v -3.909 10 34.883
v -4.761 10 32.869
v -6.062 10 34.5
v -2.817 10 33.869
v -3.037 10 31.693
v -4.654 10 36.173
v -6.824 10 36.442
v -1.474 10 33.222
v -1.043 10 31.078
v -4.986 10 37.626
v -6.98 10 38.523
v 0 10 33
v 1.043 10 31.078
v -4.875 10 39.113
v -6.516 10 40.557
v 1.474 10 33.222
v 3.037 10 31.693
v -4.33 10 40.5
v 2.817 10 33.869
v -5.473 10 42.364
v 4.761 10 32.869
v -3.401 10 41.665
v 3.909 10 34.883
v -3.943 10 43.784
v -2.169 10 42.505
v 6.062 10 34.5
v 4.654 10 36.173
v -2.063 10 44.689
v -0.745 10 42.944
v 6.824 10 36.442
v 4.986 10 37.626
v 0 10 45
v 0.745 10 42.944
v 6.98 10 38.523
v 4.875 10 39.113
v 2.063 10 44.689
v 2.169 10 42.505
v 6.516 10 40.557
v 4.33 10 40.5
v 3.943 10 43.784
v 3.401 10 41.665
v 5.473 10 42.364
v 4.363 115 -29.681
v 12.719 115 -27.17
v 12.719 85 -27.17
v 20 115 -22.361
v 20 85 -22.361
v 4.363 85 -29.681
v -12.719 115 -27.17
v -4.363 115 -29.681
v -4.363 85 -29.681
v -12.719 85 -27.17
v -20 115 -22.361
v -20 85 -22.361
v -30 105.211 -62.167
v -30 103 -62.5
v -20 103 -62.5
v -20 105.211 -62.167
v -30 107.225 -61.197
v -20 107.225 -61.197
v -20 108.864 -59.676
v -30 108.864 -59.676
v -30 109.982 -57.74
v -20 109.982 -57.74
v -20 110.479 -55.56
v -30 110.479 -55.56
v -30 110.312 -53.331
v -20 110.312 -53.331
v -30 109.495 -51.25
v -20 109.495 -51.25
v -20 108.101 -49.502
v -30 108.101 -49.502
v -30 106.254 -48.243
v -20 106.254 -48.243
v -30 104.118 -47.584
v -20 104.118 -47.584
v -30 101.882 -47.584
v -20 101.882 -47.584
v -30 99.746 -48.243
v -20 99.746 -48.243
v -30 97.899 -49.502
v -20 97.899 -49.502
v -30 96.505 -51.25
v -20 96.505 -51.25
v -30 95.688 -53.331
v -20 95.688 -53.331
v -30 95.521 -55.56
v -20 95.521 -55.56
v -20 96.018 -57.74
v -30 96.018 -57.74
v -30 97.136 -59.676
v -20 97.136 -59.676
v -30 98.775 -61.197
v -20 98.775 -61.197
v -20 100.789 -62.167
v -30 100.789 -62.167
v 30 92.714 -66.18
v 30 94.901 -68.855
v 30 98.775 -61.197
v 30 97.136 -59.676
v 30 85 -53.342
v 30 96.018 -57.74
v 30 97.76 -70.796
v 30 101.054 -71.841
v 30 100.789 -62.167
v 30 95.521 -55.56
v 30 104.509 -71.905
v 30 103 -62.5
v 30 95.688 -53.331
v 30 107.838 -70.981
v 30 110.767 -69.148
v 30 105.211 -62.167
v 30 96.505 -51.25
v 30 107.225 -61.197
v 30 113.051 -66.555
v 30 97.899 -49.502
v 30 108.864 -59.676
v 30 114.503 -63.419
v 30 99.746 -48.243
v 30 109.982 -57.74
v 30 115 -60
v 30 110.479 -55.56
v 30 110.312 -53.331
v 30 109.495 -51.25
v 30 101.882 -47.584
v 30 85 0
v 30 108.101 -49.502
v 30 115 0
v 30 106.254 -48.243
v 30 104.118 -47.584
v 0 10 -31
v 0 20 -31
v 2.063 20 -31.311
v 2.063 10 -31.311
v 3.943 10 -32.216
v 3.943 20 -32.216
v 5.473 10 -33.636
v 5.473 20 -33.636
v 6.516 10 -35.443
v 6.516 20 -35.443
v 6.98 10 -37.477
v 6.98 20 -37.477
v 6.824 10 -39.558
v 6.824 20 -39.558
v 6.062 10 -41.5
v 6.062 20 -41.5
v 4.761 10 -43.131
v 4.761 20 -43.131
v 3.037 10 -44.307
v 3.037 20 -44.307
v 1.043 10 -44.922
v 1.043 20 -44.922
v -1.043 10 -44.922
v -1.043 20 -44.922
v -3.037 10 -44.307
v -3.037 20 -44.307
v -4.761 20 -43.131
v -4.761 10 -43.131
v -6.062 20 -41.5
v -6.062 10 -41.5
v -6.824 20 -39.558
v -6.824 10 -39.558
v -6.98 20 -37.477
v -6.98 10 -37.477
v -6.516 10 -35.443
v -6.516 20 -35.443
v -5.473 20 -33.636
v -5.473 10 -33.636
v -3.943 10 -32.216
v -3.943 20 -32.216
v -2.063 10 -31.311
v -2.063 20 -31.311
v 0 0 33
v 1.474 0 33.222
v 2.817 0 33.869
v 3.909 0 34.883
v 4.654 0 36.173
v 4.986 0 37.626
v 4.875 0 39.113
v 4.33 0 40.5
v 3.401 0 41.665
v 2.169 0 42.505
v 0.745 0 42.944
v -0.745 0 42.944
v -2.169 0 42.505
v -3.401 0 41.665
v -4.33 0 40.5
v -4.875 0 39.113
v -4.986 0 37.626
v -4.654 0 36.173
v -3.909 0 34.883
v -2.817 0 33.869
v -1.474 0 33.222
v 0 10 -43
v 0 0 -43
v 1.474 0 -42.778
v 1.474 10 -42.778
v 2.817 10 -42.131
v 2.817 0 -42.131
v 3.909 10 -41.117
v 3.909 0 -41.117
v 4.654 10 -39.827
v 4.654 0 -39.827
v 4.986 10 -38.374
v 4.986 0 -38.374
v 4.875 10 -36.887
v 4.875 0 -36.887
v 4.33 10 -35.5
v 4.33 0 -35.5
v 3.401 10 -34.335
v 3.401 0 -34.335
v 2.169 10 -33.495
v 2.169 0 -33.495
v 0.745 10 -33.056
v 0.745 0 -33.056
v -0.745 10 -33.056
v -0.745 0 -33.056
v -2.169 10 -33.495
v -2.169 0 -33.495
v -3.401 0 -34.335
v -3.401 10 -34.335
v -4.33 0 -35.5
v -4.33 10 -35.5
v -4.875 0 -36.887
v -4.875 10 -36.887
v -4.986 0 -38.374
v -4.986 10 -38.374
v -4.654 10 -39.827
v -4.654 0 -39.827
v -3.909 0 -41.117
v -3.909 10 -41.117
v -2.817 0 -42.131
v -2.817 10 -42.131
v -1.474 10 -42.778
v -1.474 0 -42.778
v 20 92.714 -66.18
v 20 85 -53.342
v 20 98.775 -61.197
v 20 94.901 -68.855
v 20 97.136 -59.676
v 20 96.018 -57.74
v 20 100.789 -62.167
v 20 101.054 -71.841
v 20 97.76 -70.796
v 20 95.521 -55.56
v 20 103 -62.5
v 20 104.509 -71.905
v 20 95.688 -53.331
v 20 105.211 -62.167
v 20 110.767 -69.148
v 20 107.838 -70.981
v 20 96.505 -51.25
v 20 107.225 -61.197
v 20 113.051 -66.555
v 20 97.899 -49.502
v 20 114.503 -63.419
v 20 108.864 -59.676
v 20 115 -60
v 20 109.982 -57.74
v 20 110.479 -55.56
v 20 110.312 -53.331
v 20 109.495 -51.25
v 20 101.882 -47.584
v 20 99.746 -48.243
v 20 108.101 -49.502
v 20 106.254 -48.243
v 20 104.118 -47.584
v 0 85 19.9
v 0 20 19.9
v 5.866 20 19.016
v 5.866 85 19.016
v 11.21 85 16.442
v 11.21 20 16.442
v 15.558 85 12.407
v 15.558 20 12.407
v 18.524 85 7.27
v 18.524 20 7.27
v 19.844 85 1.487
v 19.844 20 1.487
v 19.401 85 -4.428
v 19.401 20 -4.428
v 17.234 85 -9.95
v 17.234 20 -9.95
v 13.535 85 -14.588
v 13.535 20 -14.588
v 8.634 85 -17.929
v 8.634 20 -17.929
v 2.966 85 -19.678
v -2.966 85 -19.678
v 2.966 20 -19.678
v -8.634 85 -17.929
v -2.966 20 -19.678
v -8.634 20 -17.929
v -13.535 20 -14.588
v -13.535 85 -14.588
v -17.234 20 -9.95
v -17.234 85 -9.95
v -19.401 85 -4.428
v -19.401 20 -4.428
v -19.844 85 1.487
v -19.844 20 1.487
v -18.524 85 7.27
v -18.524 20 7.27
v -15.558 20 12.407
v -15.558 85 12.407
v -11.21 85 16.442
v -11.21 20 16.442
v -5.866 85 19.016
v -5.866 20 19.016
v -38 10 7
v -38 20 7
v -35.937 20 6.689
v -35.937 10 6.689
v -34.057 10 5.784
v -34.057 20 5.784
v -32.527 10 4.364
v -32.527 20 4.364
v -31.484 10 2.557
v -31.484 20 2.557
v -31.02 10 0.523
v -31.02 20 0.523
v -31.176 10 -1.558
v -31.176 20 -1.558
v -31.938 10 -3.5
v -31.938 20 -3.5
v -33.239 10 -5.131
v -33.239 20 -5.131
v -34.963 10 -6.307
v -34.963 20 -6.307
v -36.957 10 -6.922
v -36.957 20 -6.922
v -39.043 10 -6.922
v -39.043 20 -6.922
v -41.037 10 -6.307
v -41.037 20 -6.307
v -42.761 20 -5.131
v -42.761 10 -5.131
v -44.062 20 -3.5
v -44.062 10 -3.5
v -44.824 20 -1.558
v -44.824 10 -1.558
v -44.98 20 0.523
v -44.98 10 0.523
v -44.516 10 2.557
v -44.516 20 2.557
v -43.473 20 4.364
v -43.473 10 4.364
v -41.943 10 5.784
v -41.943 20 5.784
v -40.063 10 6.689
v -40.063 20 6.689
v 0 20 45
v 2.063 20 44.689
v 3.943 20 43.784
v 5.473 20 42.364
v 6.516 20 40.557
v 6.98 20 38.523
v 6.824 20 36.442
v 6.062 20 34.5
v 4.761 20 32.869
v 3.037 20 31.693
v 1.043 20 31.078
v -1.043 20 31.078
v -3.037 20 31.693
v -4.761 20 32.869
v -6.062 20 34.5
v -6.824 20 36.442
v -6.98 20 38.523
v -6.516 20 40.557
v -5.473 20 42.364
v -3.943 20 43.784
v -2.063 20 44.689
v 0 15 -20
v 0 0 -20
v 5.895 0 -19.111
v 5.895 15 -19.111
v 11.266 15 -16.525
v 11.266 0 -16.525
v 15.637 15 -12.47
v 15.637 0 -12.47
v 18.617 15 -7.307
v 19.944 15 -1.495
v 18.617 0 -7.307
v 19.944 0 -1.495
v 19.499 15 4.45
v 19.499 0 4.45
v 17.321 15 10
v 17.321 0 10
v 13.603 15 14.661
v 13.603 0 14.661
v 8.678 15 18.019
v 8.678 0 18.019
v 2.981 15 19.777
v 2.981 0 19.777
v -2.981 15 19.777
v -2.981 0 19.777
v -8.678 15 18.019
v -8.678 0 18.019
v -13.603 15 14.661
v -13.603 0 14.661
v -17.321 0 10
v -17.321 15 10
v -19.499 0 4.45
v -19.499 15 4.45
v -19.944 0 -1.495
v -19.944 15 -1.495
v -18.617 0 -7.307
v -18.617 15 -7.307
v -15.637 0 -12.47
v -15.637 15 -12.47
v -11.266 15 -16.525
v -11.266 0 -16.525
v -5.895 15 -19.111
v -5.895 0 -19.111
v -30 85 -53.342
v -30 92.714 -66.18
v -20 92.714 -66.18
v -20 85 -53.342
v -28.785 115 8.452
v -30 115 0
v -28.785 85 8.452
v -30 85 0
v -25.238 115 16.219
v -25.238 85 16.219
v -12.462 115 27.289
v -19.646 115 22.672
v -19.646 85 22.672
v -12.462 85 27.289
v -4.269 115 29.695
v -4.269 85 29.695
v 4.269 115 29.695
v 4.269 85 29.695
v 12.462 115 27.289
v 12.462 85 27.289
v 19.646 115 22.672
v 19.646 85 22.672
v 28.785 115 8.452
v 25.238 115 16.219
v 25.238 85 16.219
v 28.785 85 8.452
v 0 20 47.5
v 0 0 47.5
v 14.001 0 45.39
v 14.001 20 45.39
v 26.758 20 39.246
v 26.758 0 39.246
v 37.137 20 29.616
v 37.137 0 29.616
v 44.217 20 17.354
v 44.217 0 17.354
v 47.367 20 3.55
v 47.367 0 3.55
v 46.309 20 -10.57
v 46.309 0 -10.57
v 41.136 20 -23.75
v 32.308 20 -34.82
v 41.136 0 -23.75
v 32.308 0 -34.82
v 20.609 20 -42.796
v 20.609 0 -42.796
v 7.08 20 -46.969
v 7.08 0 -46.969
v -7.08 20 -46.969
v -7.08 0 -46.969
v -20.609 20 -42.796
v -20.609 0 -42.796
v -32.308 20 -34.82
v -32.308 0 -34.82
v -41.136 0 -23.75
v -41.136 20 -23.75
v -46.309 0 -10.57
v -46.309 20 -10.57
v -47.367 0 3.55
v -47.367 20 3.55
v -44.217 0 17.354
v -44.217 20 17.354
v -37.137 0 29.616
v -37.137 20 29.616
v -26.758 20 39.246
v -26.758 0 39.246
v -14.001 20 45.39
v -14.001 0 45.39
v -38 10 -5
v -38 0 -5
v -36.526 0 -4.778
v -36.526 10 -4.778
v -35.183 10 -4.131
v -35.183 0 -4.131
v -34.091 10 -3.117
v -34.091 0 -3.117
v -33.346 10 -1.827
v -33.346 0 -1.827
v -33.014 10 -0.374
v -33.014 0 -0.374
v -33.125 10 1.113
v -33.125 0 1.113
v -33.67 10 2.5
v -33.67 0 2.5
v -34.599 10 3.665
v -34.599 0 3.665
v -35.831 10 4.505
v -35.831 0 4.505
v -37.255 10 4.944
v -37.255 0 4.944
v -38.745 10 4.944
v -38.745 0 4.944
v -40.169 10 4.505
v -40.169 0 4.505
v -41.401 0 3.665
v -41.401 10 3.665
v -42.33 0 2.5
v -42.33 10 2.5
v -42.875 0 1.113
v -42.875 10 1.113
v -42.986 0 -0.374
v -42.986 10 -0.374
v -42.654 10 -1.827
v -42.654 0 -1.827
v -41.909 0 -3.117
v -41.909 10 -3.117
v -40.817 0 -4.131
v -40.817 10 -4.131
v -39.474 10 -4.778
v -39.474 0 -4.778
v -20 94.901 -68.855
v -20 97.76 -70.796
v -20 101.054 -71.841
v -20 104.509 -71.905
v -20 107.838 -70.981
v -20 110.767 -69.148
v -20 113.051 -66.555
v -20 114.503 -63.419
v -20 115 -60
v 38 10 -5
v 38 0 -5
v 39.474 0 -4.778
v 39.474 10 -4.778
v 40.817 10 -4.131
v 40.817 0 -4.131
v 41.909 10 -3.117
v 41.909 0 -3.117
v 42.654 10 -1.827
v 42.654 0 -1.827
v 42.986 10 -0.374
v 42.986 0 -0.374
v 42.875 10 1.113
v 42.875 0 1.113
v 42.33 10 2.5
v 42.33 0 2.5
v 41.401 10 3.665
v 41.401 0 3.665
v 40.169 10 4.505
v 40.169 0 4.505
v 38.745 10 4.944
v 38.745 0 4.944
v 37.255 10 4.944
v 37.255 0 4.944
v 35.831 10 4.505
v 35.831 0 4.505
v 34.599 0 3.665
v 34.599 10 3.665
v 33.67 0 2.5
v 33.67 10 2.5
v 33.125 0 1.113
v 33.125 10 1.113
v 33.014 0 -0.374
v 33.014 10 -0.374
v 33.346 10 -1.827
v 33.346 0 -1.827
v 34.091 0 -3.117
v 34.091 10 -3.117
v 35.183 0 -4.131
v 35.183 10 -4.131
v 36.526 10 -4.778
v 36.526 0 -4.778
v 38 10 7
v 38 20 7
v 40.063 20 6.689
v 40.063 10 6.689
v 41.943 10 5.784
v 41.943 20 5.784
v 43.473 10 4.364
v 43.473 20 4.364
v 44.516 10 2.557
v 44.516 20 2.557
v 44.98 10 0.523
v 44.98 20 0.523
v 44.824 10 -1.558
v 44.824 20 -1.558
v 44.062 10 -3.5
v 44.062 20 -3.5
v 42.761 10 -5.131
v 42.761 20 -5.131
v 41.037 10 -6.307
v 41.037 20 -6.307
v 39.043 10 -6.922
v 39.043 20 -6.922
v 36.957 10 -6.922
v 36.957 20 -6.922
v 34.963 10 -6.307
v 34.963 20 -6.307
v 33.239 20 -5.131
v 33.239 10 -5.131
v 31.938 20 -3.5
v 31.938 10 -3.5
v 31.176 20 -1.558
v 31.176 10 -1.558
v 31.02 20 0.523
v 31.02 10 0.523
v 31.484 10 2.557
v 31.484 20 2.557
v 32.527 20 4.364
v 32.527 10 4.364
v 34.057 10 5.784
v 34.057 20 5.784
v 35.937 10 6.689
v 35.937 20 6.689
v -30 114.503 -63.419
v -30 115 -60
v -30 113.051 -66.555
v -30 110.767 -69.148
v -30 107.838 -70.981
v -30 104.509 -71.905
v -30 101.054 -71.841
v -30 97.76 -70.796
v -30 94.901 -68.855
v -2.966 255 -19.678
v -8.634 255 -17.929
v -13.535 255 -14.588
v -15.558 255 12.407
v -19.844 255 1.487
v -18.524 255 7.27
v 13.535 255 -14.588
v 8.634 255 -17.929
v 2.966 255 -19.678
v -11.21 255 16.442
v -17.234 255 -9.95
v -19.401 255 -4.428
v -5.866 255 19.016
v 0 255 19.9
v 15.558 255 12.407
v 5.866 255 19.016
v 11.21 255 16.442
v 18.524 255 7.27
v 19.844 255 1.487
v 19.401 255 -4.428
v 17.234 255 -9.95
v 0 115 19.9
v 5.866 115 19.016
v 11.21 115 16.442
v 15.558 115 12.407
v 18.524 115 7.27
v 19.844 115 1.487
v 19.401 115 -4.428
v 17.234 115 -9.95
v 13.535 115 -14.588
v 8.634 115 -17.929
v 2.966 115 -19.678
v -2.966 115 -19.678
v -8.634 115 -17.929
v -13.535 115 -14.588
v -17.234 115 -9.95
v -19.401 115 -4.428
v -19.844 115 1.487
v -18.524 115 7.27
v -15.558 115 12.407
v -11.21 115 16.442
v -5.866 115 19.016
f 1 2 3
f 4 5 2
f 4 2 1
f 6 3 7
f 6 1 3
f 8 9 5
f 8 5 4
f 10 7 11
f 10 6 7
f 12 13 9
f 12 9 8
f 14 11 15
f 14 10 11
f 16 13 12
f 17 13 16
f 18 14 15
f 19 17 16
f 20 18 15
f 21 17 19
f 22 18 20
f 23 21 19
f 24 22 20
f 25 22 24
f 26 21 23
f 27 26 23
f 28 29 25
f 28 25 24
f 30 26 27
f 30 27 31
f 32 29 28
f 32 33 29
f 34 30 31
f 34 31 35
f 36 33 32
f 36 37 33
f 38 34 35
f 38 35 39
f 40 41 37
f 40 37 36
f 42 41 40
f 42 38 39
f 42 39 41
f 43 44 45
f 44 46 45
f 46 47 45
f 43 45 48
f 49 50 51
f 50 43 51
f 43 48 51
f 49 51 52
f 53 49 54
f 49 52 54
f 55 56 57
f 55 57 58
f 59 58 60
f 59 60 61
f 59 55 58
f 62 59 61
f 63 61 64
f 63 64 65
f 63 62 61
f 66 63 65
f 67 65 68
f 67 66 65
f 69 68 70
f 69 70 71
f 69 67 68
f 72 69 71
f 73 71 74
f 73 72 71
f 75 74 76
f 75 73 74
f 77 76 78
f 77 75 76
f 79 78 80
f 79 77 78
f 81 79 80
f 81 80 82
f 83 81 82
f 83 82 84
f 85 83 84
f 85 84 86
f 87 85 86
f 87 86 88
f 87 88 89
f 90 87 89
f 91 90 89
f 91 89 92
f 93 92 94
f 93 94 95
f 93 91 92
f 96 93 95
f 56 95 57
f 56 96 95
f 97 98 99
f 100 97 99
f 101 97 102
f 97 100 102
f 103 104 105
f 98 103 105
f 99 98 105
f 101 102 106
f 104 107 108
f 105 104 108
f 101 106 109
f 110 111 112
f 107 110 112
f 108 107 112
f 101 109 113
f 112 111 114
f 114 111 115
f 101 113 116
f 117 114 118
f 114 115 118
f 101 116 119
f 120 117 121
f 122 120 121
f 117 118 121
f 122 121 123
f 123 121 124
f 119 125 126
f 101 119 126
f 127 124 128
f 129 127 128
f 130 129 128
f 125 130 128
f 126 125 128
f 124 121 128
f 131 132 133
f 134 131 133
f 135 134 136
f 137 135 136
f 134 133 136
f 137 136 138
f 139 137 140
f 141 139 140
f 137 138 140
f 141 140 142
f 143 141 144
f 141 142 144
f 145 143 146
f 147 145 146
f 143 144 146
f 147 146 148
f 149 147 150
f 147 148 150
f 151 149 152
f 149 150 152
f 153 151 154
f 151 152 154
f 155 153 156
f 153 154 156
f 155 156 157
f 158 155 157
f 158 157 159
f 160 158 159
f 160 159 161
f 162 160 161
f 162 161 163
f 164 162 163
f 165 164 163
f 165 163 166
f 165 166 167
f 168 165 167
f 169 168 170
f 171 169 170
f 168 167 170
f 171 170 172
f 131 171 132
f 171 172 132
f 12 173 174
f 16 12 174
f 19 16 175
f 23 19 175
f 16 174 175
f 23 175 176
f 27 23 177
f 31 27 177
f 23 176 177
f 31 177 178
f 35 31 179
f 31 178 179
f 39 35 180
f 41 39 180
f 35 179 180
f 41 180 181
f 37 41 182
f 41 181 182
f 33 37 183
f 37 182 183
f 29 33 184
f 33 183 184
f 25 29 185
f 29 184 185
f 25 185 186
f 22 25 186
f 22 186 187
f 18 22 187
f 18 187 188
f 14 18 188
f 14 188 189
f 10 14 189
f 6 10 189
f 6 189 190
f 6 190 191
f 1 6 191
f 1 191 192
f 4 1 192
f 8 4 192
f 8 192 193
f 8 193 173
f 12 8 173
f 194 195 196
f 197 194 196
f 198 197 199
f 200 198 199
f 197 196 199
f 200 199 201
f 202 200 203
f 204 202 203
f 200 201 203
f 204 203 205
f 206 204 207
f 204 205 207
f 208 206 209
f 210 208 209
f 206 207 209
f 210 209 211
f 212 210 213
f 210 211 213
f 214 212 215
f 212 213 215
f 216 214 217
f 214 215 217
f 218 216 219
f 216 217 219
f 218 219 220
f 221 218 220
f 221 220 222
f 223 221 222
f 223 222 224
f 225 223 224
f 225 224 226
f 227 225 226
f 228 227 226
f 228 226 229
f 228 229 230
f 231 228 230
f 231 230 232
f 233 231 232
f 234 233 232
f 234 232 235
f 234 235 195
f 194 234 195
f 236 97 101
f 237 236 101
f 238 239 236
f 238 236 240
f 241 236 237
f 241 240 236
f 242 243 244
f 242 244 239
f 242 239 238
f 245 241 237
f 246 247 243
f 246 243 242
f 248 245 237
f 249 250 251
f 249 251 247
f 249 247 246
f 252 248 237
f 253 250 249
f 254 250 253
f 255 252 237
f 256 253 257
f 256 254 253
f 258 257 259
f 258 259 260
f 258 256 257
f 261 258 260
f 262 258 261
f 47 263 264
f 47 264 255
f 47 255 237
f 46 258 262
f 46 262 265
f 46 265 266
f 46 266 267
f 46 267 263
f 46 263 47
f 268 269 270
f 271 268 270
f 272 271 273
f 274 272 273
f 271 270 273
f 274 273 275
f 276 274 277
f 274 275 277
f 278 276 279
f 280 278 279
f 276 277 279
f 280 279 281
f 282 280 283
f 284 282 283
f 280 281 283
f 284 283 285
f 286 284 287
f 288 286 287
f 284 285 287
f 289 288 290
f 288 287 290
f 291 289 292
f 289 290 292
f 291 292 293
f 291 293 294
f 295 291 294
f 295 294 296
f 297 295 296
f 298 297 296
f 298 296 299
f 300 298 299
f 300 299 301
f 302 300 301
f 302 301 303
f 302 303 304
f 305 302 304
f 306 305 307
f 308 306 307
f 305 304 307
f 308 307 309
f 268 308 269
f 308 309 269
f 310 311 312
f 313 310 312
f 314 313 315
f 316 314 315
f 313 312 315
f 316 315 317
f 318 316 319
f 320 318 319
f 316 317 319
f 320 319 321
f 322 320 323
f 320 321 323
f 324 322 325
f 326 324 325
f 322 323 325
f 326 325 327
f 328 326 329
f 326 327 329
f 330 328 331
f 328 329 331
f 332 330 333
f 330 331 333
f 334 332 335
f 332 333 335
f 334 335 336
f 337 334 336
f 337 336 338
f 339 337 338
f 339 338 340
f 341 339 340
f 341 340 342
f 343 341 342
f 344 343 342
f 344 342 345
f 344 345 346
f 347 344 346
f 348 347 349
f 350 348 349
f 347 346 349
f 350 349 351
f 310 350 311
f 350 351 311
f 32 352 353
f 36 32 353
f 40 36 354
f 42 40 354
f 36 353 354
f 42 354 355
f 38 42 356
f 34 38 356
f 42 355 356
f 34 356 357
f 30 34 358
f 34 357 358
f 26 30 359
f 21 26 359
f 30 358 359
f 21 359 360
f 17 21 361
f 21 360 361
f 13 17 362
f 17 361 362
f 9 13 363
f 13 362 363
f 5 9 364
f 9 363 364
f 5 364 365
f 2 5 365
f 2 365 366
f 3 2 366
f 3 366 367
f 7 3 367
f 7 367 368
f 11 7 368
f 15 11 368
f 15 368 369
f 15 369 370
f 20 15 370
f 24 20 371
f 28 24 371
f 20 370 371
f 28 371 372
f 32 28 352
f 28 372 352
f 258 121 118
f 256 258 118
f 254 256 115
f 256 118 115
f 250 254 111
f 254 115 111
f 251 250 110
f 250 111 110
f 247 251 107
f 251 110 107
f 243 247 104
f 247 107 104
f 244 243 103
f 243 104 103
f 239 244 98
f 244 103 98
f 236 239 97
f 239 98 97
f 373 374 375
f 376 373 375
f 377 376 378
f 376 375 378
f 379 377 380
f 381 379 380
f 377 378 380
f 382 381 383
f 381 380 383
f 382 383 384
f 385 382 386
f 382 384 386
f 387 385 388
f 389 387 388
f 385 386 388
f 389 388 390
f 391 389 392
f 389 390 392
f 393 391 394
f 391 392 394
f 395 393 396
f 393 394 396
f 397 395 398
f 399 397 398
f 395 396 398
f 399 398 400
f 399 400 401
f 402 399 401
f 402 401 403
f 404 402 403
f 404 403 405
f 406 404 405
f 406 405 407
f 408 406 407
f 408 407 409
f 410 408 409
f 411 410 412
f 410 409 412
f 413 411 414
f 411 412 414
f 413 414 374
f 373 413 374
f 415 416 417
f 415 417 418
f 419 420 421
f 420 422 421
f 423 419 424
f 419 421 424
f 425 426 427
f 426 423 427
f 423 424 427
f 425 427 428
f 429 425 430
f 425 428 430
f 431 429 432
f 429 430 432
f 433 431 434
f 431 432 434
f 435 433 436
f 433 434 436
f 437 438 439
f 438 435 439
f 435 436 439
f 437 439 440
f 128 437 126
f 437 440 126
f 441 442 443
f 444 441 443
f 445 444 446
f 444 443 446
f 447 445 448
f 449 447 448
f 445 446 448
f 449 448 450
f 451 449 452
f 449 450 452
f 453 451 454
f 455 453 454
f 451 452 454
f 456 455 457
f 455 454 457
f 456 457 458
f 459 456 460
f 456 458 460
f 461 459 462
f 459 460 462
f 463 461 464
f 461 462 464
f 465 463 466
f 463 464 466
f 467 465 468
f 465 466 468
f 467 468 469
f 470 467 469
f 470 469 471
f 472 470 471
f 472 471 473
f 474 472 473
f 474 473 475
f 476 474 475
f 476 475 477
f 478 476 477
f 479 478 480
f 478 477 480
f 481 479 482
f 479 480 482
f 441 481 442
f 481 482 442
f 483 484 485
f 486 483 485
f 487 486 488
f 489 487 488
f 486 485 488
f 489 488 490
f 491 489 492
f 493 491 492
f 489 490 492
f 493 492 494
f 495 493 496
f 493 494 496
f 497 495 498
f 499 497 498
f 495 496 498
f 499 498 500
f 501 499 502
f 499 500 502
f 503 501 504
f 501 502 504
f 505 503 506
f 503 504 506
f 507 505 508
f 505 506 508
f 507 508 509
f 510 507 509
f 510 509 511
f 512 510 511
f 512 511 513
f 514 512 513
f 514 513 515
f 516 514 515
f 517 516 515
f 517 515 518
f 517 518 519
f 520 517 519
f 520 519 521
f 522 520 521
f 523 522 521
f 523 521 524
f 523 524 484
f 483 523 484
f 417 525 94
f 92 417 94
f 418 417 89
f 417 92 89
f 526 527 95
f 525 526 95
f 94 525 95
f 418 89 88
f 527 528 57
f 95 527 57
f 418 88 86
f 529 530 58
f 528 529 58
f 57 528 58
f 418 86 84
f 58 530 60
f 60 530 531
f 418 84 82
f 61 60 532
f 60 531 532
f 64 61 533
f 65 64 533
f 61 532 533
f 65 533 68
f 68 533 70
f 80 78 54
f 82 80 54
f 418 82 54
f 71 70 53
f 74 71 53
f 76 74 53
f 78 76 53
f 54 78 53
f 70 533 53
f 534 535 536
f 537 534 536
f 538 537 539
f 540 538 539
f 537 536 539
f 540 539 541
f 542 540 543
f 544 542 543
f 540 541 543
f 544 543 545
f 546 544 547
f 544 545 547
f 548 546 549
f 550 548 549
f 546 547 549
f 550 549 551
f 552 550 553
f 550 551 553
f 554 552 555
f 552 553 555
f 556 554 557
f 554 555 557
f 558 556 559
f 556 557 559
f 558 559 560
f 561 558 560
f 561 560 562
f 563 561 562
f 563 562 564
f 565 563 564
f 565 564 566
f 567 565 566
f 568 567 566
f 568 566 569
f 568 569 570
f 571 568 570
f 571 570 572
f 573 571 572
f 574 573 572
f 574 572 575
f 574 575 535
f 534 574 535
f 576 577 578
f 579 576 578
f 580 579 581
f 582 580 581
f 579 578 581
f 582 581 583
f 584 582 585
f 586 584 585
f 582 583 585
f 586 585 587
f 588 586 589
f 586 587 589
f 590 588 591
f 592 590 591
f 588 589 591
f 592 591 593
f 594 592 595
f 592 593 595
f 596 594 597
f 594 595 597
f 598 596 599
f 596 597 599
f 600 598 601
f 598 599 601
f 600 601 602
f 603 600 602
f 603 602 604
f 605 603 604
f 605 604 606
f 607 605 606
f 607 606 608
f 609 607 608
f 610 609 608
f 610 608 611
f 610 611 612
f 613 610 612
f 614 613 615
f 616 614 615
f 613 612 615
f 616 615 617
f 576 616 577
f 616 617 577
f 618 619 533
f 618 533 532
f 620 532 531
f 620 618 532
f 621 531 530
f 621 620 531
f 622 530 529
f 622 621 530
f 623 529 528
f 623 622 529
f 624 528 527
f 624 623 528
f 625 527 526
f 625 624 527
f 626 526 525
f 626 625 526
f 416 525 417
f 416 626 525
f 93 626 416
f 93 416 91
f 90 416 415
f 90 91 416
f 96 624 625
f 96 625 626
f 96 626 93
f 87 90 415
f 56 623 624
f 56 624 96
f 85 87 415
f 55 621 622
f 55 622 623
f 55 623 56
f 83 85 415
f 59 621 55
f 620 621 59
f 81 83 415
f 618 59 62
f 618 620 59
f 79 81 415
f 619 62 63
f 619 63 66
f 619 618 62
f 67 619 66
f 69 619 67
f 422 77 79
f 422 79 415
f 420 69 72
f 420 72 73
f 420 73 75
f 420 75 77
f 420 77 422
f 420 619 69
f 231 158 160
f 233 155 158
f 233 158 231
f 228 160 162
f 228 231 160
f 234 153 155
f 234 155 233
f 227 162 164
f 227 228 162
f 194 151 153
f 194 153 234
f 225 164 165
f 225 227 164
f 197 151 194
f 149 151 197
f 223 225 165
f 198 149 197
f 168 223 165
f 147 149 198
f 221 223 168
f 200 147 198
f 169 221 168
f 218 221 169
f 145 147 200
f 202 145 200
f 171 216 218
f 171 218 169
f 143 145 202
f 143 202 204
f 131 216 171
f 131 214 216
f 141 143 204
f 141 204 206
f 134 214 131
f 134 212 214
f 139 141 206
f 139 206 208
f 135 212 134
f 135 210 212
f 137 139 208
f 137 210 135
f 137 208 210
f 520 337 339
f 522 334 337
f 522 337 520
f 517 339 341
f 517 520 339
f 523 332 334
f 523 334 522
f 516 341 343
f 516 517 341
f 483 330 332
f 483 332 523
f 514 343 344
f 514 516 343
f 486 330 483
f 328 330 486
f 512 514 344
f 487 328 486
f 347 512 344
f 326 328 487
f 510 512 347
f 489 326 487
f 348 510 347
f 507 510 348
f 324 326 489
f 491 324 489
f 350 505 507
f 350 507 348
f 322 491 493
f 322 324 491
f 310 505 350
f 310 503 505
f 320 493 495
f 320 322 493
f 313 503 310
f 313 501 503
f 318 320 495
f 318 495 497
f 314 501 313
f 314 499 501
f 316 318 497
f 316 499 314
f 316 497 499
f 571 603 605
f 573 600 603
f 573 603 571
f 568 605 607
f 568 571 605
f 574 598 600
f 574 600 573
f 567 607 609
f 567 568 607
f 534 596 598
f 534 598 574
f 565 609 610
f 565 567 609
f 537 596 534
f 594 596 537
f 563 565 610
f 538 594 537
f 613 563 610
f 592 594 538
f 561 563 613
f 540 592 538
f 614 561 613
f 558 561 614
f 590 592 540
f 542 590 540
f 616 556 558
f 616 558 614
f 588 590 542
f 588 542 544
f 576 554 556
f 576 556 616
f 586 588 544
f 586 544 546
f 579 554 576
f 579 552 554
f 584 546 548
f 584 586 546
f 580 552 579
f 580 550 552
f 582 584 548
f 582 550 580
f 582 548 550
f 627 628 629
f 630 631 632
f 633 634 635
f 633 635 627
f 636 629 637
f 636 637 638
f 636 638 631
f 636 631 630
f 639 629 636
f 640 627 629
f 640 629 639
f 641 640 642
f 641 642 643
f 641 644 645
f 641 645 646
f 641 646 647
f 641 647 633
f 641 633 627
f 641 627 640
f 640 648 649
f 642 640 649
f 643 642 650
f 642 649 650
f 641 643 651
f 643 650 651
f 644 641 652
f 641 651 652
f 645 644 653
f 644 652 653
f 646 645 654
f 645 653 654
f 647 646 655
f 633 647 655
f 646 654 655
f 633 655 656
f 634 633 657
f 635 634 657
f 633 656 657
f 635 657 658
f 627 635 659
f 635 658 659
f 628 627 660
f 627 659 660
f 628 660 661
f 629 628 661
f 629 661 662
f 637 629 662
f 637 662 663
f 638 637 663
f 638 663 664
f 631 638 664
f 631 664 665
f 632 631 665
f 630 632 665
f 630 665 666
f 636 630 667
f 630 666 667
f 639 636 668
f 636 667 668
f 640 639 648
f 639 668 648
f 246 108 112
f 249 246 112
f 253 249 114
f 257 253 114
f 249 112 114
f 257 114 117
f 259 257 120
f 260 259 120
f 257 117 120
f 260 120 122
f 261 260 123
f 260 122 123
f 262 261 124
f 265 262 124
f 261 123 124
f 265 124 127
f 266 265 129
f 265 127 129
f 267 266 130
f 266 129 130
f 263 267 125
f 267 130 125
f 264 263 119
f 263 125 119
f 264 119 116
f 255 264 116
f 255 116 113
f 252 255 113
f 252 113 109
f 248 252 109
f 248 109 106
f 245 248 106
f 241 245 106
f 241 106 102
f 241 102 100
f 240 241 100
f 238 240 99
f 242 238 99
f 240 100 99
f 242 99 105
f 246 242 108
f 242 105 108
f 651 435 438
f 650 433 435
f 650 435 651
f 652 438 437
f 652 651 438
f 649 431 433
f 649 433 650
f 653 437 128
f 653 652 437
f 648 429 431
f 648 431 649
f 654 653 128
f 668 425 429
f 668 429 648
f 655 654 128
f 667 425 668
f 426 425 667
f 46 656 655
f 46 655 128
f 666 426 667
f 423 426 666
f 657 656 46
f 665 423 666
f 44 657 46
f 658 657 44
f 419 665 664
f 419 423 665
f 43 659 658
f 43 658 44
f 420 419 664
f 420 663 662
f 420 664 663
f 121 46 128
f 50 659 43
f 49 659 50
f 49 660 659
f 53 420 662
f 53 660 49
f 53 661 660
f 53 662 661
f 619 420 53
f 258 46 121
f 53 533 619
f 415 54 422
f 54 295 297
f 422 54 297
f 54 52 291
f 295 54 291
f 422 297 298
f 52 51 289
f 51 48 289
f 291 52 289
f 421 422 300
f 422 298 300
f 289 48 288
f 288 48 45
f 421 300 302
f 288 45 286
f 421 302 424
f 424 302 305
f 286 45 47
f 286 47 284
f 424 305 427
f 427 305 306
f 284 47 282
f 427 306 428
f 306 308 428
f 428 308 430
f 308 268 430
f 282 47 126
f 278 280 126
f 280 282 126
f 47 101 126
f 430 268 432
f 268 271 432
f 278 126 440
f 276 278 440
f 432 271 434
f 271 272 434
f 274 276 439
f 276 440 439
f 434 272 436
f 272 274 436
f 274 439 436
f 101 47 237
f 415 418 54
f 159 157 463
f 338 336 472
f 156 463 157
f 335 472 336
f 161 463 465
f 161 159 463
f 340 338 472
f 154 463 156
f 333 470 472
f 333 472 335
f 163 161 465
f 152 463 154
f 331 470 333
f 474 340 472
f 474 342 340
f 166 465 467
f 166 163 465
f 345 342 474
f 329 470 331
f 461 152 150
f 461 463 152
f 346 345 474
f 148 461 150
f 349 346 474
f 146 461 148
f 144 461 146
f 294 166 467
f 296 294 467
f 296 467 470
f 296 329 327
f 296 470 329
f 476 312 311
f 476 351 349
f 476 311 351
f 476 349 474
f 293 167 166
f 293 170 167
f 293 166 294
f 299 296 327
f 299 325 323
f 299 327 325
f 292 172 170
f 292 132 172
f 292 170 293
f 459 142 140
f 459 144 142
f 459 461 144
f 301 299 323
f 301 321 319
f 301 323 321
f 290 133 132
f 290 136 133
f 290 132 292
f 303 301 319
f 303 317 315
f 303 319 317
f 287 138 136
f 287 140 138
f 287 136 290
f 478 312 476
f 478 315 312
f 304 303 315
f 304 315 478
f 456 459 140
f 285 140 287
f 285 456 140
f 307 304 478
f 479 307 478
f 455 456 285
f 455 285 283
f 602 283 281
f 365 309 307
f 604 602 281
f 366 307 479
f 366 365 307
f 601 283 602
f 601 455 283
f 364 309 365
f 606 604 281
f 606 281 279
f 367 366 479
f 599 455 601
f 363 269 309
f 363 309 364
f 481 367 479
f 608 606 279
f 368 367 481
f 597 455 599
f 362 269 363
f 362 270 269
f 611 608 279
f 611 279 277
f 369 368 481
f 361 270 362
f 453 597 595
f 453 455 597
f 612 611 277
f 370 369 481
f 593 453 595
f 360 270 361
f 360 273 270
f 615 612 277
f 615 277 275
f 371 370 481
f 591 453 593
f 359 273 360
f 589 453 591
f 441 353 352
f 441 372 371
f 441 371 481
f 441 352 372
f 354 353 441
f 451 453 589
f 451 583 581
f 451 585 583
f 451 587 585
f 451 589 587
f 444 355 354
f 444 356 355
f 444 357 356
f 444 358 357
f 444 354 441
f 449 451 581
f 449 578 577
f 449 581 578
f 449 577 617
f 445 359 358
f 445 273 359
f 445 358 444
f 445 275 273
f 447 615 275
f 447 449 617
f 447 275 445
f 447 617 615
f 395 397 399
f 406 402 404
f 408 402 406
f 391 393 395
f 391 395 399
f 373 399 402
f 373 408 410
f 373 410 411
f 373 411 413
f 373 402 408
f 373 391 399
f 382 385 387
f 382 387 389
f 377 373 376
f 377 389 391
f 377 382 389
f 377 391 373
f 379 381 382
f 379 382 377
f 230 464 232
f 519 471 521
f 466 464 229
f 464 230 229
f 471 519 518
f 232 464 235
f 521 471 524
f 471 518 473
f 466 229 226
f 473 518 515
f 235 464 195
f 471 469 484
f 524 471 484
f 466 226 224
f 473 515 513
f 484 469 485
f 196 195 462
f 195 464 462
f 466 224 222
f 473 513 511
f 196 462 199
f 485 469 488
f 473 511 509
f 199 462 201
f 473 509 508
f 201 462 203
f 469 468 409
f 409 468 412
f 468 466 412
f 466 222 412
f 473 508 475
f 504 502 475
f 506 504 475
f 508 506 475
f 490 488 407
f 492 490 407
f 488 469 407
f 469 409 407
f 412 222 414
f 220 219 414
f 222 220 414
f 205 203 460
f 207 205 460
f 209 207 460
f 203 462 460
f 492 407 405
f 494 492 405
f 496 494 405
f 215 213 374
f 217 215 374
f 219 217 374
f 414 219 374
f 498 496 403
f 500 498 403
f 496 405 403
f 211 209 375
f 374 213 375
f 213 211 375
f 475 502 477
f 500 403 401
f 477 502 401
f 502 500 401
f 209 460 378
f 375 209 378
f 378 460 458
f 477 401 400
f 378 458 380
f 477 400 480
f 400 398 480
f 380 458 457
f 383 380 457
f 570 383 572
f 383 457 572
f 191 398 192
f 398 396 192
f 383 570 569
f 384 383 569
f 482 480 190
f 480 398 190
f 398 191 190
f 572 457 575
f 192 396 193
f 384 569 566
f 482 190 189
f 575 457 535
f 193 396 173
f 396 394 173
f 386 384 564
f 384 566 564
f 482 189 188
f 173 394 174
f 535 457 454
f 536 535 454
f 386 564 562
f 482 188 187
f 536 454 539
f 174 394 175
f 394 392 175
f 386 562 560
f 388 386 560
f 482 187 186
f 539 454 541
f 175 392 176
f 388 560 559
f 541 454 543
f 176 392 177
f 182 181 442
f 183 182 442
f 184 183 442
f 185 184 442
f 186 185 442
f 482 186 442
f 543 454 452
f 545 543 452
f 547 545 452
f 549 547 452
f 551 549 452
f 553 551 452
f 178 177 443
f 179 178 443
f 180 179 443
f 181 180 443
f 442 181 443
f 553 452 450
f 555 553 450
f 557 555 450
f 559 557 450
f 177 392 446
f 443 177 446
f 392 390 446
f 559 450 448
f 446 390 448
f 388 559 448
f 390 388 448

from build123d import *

# Parameters (mm, degrees)
SKETCH1_R           = 47.5
BOSS_EXTRUDE1_DEPTH = 20
SKETCH2_R           = 19.9
BOSS_EXTRUDE2_DEPTH = 65
SKETCH3_R           = 30
BOSS_EXTRUDE3_DEPTH = 30
SKETCH4_R           = 19.9
BOSS_EXTRUDE4_DEPTH = 140
SKETCH5_R           = 7.5
BOSS_EXTRUDE5_DEPTH = 10
SKETCH6_R           = 7
CUT_EXTRUDE1_DEPTH  = 10
SKETCH7_R           = 5
CUT_EXTRUDE2_DEPTH  = 23
SKETCH8_R           = 20
CUT_EXTRUDE3_DEPTH  = 15


with BuildPart() as part:
    # Sketch1 → Boss-Extrude1 (new body)
    with BuildSketch(Plane(origin=(0, 0, 0), x_dir=(1, 0, 0), z_dir=(0, 1, 0))):
        with Locations(Location((0, 0, 0), (0, 0, 270))):
            Circle(SKETCH1_R)
    extrude(amount=BOSS_EXTRUDE1_DEPTH)

    # Sketch2 → Boss-Extrude2 (add)
    with BuildSketch(Plane(origin=(0, 20, 0), x_dir=(1, 0, 0), z_dir=(0, 1, 0))):
        with Locations(Location((0, 0, 0), (0, 0, 270))):
            Circle(SKETCH2_R)
    extrude(amount=BOSS_EXTRUDE2_DEPTH)

    # Sketch3 → Boss-Extrude3 (add)
    with BuildSketch(Plane(origin=(0, 85, 0), x_dir=(1, 0, 0), z_dir=(0, 1, 0))):
        with Locations(Location((0, 0, 0), (0, 0, 270))):
            Circle(SKETCH3_R)
    extrude(amount=BOSS_EXTRUDE3_DEPTH)

    # Sketch4 → Boss-Extrude4 (add)
    with BuildSketch(Plane(origin=(0, 115, 0), x_dir=(1, 0, 0), z_dir=(0, 1, 0))):
        with Locations(Location((0, 0, 0), (0, 0, 270))):
            Circle(SKETCH4_R)
    extrude(amount=BOSS_EXTRUDE4_DEPTH)

    # Sketch5 → Boss-Extrude5 (add)
    with BuildSketch(Plane(origin=(30, 0, 0), x_dir=(0, 0, -1), z_dir=(1, 0, 0))):
        with BuildLine():
            Line((0, 115), (55, 115))
            Line((55, 115), (60, 115))
            ThreePointArc((60, 115), (71.563565439, 106.206860513), (66.180456899, 92.713992392))
            Line((66.180456899, 92.713992392), (53.342217635, 85))
            Line((53.342217635, 85), (0, 85))
            Line((0, 85), (0, 115))
        make_face()
        with Locations((55, 103)):
            Circle(SKETCH5_R, mode=Mode.SUBTRACT)
    boss_extrude5 = extrude(amount=-BOSS_EXTRUDE5_DEPTH)

    # Mirror1: Boss-Extrude5 across plane
    add(boss_extrude5.mirror(Plane(origin=(0, 0, 0), x_dir=(0, 0, 1), z_dir=(1, 0, 0))))

    # Sketch6 → Cut-Extrude1 (cut)
    with BuildSketch(Plane(origin=(0, 20, 0), x_dir=(1, 0, 0), z_dir=(0, 1, 0))):
        with Locations(Location((0, 38, 0), (0, 0, 270))):
            Circle(SKETCH6_R)
        with Locations(Location((38, 0, 0), (0, 0, 270))):
            Circle(SKETCH6_R)
        with Locations(Location((0, -38, 0), (0, 0, 270))):
            Circle(SKETCH6_R)
        with Locations(Location((-38, 0, 0), (0, 0, 270))):
            Circle(SKETCH6_R)
    extrude(amount=-CUT_EXTRUDE1_DEPTH, mode=Mode.SUBTRACT)

    # Sketch7 → Cut-Extrude2 (cut)
    with BuildSketch(Plane.XZ):
        with Locations(Location((0, 38, 0), (0, 0, 270))):
            Circle(SKETCH7_R)
        with Locations(Location((38, 0, 0), (0, 0, 270))):
            Circle(SKETCH7_R)
        with Locations(Location((0, -38, 0), (0, 0, 270))):
            Circle(SKETCH7_R)
        with Locations(Location((-38, 0, 0), (0, 0, 270))):
            Circle(SKETCH7_R)
    extrude(amount=-CUT_EXTRUDE2_DEPTH, mode=Mode.SUBTRACT)

    # Sketch8 → Cut-Extrude3 (cut)
    with BuildSketch(Plane.XZ):
        with Locations(Location((0, 0, 0), (0, 0, 270))):
            Circle(SKETCH8_R)
    extrude(amount=-CUT_EXTRUDE3_DEPTH, mode=Mode.SUBTRACT)


solid = part.part
